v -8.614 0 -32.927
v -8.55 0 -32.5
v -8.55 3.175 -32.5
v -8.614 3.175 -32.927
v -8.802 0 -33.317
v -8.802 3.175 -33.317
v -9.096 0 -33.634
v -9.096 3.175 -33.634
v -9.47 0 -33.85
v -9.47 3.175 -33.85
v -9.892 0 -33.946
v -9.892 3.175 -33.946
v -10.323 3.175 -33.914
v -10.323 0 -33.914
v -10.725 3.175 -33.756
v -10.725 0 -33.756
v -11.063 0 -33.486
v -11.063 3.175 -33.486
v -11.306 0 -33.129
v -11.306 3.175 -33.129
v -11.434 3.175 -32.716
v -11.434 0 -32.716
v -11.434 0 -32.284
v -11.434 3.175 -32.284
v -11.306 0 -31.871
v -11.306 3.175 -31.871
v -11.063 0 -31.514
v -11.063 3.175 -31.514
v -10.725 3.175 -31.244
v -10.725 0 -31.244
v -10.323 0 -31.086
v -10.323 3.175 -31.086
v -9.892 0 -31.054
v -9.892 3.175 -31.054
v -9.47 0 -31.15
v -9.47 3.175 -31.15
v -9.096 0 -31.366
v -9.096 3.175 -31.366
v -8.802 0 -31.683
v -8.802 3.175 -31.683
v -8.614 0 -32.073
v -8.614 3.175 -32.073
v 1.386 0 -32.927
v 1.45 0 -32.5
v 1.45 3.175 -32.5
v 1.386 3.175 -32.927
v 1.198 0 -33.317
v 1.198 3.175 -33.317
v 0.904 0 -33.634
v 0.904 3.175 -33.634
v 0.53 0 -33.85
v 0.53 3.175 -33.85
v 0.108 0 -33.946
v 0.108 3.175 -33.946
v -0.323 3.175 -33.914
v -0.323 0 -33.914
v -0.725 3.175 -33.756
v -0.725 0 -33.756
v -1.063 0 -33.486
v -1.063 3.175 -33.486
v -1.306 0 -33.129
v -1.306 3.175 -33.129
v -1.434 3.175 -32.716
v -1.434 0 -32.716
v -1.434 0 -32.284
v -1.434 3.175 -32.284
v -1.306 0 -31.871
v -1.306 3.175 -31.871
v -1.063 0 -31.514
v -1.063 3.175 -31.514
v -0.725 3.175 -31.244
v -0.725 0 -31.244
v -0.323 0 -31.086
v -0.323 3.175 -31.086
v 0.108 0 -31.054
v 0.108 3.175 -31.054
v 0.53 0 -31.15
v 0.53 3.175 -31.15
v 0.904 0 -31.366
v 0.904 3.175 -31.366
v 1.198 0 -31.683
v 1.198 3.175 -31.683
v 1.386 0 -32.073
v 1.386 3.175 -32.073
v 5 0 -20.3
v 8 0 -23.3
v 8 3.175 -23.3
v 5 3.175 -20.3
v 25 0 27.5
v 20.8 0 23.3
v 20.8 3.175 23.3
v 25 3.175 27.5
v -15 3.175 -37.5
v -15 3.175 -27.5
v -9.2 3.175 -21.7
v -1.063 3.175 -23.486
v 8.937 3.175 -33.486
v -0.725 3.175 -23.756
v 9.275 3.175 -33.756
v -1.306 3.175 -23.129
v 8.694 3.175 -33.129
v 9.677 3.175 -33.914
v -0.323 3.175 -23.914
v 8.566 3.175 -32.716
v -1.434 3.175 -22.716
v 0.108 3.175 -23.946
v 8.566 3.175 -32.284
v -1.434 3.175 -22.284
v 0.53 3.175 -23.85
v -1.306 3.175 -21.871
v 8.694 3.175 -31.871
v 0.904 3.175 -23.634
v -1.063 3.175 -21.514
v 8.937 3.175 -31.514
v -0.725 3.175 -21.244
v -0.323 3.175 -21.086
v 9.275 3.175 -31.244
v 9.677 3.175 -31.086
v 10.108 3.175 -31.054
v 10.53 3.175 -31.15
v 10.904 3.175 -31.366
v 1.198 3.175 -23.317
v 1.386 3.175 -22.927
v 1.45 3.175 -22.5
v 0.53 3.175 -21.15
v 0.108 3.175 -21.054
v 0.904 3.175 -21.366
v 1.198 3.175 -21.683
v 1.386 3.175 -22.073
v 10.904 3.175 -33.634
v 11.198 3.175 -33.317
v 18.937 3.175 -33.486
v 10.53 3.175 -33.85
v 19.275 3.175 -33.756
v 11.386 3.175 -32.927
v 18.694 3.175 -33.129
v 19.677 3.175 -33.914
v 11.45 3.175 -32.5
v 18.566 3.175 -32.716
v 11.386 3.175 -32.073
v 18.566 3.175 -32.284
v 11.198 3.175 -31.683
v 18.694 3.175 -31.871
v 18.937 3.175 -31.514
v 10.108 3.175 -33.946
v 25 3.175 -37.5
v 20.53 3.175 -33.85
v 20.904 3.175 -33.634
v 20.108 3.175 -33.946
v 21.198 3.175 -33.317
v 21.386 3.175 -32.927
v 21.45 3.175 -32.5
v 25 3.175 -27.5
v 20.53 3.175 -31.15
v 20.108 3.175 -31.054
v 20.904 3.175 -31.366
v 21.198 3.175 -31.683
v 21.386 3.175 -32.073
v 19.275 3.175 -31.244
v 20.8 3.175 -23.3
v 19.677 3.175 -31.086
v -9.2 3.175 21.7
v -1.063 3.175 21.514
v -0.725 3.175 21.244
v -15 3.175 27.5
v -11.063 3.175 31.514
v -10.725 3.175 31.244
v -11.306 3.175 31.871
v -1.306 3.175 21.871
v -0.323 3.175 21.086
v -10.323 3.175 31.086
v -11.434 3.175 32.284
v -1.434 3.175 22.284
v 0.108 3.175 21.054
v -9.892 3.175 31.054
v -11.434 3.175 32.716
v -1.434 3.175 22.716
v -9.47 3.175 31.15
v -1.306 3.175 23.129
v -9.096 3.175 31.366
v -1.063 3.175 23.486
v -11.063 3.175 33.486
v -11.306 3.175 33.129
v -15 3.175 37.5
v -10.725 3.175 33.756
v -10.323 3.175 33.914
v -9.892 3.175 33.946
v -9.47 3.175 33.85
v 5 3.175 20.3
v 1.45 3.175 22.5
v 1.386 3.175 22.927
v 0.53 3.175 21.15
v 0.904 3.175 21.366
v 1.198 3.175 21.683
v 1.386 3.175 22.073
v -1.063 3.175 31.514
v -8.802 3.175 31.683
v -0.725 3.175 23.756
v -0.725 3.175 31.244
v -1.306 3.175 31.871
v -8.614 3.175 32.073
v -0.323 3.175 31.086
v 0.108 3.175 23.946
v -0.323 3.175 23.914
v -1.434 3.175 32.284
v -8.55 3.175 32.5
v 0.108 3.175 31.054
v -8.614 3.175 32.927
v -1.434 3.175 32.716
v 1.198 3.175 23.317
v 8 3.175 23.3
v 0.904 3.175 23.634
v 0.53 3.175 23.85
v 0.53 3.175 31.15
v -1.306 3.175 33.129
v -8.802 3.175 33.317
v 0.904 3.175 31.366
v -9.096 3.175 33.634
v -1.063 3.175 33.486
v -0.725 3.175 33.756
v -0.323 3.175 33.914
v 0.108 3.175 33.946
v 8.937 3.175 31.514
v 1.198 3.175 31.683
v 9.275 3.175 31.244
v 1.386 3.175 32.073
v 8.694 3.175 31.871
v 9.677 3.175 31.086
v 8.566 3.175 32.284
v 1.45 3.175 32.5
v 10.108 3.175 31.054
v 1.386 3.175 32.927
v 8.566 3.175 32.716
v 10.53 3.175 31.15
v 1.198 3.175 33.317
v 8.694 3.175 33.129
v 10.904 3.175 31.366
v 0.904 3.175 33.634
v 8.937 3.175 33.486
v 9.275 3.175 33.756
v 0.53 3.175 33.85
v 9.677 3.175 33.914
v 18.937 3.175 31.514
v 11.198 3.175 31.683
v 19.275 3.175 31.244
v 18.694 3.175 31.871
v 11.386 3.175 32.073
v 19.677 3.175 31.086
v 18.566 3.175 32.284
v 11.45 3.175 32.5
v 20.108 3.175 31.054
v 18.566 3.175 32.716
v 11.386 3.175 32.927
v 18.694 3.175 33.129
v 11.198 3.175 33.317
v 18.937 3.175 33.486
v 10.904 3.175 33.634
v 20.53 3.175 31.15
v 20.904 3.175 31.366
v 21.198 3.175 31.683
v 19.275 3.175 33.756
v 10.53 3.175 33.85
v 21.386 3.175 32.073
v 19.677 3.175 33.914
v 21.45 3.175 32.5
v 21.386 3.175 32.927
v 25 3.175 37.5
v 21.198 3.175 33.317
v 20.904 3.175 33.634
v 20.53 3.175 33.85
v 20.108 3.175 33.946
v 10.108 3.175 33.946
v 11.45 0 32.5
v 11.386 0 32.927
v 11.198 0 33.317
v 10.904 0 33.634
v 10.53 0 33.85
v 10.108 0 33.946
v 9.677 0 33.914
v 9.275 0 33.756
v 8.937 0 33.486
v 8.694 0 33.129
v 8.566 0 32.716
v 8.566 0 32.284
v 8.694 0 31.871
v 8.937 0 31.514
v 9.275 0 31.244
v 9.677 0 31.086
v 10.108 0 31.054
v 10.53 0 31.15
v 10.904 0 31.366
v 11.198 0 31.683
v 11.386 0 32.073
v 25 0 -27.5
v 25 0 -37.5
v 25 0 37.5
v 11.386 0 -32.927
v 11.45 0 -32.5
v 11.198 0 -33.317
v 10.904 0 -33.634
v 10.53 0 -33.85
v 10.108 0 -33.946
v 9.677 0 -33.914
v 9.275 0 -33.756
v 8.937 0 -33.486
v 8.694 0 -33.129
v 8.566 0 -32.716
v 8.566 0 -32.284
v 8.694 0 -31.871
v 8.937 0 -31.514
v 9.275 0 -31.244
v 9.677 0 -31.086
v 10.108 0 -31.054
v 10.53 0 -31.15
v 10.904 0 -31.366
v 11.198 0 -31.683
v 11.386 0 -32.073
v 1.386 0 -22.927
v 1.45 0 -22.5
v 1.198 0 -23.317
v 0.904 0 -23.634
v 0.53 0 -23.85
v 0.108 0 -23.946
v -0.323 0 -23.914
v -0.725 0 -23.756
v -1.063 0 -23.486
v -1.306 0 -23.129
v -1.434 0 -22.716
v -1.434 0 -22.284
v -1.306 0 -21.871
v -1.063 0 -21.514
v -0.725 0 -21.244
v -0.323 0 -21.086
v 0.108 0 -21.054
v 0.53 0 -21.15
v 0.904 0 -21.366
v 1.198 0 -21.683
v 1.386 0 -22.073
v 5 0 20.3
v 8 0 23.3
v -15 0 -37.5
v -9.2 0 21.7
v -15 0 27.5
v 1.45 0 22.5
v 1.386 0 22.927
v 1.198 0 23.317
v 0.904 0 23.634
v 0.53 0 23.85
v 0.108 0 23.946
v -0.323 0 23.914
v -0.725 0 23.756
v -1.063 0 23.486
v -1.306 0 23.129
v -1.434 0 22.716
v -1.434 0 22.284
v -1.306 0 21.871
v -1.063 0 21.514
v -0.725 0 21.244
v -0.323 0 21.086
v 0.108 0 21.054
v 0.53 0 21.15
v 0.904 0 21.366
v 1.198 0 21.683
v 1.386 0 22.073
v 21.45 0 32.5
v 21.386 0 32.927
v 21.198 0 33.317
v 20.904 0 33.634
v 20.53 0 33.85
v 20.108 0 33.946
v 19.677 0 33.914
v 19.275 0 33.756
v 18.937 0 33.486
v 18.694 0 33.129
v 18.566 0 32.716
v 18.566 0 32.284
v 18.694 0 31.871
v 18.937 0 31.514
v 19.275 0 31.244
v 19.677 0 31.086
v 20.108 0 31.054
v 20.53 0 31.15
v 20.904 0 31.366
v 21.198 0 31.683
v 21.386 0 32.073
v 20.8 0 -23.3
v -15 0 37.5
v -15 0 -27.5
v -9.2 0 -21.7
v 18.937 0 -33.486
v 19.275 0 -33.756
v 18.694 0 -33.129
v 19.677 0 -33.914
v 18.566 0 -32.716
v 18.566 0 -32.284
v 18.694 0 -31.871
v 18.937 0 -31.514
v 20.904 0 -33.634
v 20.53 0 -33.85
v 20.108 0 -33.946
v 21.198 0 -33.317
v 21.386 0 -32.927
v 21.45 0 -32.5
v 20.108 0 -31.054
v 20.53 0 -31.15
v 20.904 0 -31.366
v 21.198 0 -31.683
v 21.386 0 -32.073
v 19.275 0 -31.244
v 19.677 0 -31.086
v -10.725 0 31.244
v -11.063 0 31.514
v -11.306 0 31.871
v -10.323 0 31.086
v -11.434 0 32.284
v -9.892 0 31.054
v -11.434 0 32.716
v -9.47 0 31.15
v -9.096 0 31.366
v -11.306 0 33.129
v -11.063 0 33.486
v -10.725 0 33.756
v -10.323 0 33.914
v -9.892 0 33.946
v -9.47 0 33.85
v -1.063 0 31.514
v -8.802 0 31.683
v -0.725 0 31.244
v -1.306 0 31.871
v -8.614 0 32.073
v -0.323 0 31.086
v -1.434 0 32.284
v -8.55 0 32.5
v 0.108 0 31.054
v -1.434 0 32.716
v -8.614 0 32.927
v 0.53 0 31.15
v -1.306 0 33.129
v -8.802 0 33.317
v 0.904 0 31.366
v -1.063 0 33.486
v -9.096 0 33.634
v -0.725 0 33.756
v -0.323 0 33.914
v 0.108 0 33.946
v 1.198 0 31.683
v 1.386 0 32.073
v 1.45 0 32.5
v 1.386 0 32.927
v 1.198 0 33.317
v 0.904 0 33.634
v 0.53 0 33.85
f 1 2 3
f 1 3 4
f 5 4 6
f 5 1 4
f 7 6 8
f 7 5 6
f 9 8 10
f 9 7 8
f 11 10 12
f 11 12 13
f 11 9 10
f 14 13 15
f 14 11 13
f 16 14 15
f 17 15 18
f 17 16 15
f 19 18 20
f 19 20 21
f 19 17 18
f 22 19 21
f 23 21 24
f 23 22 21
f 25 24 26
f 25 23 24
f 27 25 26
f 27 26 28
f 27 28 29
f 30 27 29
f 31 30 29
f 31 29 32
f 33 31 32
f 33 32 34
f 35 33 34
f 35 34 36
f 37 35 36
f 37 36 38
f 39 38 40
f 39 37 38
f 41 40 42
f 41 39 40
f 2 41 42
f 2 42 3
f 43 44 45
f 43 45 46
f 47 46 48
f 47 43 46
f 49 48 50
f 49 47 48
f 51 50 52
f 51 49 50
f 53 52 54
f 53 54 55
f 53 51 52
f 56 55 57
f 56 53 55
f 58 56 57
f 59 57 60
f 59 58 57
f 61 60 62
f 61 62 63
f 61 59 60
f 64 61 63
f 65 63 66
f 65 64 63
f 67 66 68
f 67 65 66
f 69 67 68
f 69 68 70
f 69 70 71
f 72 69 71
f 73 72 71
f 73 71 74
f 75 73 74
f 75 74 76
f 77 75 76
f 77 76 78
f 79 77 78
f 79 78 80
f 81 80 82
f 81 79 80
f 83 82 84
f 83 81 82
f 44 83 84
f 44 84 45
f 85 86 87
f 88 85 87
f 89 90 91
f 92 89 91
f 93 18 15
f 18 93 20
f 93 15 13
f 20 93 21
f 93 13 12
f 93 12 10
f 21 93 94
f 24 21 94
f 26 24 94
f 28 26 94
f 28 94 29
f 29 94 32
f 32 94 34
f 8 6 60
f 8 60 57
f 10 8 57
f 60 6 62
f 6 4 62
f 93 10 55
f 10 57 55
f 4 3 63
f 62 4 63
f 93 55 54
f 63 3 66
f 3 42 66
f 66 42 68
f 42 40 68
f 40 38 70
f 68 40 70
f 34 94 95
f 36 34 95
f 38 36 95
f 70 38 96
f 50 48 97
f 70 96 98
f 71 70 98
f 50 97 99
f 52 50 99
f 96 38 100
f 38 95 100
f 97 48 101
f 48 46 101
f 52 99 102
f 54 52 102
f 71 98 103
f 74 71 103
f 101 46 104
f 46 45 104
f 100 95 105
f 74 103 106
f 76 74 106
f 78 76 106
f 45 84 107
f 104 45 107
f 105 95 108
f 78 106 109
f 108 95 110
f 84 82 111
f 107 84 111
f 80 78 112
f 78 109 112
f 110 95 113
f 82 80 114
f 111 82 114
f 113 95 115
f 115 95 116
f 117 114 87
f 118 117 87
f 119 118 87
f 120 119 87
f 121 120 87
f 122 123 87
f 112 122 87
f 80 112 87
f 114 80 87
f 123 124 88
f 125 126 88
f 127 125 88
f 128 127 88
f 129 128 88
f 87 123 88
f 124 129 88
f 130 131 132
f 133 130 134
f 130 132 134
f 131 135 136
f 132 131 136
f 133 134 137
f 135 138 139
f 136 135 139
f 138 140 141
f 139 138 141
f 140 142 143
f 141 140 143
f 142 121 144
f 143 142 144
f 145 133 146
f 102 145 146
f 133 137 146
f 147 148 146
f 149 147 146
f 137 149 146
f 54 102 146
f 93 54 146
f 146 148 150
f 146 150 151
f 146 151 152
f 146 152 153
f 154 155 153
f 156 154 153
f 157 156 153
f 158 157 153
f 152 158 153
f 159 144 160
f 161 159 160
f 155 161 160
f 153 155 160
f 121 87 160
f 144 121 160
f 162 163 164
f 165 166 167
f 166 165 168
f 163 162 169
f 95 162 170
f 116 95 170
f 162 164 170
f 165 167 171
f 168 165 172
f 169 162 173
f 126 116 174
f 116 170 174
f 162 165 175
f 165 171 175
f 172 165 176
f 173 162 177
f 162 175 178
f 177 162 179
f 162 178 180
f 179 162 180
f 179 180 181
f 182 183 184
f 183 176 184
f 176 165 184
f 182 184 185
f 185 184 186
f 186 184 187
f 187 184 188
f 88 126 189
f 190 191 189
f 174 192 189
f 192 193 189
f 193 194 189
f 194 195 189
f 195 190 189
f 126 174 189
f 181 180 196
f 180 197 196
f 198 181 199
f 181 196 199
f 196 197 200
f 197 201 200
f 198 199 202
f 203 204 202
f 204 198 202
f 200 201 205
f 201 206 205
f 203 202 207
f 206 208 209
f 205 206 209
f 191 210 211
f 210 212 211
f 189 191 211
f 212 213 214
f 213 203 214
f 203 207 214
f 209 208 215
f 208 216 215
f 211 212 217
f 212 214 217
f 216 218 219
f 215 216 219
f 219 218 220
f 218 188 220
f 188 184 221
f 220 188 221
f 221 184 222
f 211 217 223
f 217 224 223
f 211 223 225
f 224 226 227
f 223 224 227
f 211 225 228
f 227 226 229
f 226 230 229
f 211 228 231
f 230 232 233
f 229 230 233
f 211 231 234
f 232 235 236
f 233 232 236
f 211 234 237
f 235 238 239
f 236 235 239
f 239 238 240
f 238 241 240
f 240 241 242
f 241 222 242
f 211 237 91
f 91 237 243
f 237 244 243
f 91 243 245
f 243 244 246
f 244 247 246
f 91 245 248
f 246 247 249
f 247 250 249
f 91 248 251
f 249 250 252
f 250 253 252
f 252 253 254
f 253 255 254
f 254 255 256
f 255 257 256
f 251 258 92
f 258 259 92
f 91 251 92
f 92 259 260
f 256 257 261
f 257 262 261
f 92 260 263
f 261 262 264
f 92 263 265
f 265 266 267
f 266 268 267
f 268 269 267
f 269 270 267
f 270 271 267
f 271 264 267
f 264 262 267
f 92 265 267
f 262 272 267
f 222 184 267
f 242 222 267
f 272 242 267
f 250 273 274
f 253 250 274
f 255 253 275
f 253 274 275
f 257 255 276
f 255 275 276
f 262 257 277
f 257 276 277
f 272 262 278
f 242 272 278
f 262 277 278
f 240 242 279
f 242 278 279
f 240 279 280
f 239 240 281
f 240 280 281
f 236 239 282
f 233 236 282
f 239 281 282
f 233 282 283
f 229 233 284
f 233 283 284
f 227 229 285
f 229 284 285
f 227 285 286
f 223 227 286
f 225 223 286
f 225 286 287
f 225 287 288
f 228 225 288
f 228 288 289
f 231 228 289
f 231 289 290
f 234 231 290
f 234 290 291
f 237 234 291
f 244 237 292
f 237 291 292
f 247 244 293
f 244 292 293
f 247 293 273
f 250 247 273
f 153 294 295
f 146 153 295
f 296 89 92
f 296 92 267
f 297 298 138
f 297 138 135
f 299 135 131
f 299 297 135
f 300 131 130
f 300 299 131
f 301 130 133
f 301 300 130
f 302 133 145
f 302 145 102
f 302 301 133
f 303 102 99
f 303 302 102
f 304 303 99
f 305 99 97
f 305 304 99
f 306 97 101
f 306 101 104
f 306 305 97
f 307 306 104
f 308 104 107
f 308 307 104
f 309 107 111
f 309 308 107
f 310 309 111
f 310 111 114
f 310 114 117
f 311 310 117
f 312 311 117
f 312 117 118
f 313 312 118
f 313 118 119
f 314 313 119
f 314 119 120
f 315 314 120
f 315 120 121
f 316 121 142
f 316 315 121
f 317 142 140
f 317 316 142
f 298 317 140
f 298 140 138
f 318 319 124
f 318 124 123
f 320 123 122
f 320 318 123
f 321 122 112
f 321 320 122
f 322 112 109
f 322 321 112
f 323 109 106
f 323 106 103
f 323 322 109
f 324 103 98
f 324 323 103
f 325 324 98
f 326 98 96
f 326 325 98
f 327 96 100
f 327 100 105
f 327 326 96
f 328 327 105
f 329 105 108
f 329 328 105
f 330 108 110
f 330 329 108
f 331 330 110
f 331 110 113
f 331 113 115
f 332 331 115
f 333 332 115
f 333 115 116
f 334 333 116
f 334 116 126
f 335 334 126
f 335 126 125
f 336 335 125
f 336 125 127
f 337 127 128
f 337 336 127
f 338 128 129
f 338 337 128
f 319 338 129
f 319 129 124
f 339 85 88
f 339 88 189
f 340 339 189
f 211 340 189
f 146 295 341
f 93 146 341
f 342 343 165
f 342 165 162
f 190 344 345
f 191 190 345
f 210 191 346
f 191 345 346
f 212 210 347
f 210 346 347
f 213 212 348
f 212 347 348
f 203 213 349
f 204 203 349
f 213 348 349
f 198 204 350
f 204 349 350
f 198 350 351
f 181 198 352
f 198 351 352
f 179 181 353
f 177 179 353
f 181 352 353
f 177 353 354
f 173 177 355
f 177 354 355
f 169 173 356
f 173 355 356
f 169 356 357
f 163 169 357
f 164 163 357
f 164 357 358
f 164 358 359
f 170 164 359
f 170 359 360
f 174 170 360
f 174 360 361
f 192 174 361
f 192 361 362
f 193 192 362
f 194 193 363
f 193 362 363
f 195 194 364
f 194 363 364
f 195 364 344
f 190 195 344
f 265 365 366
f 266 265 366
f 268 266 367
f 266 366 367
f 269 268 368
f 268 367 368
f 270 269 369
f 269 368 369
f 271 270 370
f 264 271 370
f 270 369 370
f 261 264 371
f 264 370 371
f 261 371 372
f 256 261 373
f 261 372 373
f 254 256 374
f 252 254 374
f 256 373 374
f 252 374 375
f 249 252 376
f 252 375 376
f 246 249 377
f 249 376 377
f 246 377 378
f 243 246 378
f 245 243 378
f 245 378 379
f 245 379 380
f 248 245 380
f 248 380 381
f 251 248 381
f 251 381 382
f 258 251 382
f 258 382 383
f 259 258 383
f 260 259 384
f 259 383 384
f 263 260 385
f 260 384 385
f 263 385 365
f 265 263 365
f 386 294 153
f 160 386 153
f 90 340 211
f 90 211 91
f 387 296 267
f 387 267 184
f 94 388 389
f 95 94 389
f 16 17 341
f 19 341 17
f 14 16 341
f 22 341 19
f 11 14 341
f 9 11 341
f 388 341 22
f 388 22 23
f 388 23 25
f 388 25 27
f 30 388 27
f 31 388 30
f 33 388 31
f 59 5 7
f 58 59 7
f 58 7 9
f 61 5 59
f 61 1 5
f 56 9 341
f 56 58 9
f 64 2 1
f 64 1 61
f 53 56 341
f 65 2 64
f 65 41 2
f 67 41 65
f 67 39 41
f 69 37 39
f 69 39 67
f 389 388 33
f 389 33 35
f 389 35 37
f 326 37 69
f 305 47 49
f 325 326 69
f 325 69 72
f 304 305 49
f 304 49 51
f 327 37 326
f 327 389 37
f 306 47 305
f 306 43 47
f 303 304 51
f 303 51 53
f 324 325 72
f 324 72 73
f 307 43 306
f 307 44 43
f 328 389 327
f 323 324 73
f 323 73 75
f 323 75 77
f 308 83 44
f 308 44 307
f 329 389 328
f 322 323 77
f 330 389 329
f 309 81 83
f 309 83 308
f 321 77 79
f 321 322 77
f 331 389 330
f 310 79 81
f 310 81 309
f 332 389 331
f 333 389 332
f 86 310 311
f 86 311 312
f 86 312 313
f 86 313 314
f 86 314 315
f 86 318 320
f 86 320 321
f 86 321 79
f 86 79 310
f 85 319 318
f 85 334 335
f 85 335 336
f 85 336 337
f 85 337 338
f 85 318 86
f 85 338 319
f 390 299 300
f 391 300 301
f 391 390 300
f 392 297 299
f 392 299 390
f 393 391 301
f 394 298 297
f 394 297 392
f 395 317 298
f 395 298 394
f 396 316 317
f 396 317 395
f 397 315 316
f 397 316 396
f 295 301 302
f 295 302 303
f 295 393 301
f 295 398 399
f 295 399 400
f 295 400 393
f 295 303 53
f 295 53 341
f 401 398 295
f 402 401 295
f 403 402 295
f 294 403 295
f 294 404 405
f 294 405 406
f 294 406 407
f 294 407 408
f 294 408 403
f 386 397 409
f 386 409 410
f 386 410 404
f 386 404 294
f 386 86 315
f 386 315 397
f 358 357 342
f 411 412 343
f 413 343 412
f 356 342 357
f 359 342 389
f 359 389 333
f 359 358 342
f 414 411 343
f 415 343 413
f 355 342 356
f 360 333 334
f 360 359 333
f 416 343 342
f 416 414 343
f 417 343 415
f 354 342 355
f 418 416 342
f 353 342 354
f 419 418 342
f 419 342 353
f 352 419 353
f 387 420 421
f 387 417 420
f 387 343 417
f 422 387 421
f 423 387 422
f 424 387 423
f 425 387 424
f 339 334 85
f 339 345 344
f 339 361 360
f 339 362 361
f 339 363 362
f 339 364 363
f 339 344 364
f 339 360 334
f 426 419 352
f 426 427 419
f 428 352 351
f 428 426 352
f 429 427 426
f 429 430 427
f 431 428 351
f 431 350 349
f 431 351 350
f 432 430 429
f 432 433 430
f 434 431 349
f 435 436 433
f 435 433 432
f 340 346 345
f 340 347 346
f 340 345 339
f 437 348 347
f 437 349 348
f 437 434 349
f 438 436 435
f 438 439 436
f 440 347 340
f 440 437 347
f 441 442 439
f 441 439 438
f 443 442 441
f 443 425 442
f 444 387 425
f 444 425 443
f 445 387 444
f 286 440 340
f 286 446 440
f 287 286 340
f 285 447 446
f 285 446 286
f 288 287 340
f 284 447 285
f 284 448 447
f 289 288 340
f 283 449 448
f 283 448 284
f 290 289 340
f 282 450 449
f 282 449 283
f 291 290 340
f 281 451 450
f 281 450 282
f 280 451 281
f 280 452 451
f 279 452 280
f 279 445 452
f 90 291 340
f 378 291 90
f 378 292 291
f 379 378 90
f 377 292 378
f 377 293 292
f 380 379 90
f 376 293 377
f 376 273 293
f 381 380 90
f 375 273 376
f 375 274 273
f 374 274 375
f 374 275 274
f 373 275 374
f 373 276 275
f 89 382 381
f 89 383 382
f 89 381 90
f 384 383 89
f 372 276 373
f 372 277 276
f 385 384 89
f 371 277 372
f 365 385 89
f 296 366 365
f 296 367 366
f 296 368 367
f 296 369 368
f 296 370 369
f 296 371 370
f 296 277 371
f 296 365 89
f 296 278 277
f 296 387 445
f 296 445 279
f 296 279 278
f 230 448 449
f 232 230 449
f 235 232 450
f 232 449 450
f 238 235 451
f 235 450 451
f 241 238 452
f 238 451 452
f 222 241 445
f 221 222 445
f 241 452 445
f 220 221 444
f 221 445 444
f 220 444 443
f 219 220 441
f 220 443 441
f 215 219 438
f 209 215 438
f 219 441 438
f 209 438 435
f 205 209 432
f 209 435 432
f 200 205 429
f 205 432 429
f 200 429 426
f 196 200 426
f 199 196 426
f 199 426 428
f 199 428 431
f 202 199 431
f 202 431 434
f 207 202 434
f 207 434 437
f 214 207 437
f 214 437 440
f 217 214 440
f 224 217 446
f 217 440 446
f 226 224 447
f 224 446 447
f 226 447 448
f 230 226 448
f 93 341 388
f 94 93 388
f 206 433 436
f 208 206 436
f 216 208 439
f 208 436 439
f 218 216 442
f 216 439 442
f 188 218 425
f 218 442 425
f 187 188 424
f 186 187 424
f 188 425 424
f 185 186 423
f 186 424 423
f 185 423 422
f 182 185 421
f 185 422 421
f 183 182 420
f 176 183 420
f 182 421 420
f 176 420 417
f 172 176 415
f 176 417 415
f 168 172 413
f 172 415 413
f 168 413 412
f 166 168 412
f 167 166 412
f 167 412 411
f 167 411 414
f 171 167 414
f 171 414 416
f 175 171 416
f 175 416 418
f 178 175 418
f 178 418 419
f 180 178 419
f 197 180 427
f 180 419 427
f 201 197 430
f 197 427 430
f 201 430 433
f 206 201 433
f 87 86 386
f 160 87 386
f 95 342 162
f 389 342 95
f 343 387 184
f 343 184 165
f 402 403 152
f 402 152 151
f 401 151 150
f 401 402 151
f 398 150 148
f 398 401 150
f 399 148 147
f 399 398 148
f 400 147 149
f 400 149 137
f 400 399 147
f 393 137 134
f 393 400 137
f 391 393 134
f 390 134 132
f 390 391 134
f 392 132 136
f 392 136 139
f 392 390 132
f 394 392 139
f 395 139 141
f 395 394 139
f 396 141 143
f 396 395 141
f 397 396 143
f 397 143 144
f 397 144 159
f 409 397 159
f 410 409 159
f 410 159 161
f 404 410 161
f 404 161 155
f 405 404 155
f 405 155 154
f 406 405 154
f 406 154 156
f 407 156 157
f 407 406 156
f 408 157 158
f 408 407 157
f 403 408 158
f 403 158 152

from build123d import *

# Parameters (mm, degrees)
SKETCH1_R           = 1.45
BOSS_EXTRUDE1_DEPTH = 3.175
CHAMFER1_SIZE       = 4.2
CHAMFER2_SIZE       = 3


with BuildPart() as part:
    # Sketch1 → Boss-Extrude1 (new body)
    with BuildSketch(Plane(origin=(0, 0, 0), x_dir=(1, 0, 0), z_dir=(0, 1, 0))):
        Polygon((5, 23.3), (25, 23.3), (25, 37.5), (-15, 37.5), (-15, 27.5), (-9.2, 21.7), (-9.2, 0), (5, 0), align=None)
        with Locations((0, 22.5)):
            Circle(SKETCH1_R, mode=Mode.SUBTRACT)
        with Locations((-10, 32.5)):
            Circle(SKETCH1_R, mode=Mode.SUBTRACT)
        with Locations((20, 32.5)):
            Circle(SKETCH1_R, mode=Mode.SUBTRACT)
        with Locations((0, 32.5)):
            Circle(SKETCH1_R, mode=Mode.SUBTRACT)
        with Locations((10, 32.5)):
            Circle(SKETCH1_R, mode=Mode.SUBTRACT)
    boss_extrude1 = extrude(amount=BOSS_EXTRUDE1_DEPTH)

    # Mirror1: Boss-Extrude1 across plane
    add(boss_extrude1.mirror(Plane(origin=(5, 3.175, 0), x_dir=(1, 0, 0), z_dir=(0, 0, -1))))

    # Chamfer1
    chamfer1_edges = [part.edges().sort_by_distance(p)[0] for p in [
        (25, 1.5875, -23.3),
        (25, 1.5875, 23.3),
    ]]
    chamfer(chamfer1_edges, length=CHAMFER1_SIZE)

    # Chamfer2
    chamfer2_edges = [part.edges().sort_by_distance(p)[0] for p in [
        (5, 1.5875, -23.3),
        (5, 1.5875, 23.3),
    ]]
    chamfer(chamfer2_edges, length=CHAMFER2_SIZE)


solid = part.part
